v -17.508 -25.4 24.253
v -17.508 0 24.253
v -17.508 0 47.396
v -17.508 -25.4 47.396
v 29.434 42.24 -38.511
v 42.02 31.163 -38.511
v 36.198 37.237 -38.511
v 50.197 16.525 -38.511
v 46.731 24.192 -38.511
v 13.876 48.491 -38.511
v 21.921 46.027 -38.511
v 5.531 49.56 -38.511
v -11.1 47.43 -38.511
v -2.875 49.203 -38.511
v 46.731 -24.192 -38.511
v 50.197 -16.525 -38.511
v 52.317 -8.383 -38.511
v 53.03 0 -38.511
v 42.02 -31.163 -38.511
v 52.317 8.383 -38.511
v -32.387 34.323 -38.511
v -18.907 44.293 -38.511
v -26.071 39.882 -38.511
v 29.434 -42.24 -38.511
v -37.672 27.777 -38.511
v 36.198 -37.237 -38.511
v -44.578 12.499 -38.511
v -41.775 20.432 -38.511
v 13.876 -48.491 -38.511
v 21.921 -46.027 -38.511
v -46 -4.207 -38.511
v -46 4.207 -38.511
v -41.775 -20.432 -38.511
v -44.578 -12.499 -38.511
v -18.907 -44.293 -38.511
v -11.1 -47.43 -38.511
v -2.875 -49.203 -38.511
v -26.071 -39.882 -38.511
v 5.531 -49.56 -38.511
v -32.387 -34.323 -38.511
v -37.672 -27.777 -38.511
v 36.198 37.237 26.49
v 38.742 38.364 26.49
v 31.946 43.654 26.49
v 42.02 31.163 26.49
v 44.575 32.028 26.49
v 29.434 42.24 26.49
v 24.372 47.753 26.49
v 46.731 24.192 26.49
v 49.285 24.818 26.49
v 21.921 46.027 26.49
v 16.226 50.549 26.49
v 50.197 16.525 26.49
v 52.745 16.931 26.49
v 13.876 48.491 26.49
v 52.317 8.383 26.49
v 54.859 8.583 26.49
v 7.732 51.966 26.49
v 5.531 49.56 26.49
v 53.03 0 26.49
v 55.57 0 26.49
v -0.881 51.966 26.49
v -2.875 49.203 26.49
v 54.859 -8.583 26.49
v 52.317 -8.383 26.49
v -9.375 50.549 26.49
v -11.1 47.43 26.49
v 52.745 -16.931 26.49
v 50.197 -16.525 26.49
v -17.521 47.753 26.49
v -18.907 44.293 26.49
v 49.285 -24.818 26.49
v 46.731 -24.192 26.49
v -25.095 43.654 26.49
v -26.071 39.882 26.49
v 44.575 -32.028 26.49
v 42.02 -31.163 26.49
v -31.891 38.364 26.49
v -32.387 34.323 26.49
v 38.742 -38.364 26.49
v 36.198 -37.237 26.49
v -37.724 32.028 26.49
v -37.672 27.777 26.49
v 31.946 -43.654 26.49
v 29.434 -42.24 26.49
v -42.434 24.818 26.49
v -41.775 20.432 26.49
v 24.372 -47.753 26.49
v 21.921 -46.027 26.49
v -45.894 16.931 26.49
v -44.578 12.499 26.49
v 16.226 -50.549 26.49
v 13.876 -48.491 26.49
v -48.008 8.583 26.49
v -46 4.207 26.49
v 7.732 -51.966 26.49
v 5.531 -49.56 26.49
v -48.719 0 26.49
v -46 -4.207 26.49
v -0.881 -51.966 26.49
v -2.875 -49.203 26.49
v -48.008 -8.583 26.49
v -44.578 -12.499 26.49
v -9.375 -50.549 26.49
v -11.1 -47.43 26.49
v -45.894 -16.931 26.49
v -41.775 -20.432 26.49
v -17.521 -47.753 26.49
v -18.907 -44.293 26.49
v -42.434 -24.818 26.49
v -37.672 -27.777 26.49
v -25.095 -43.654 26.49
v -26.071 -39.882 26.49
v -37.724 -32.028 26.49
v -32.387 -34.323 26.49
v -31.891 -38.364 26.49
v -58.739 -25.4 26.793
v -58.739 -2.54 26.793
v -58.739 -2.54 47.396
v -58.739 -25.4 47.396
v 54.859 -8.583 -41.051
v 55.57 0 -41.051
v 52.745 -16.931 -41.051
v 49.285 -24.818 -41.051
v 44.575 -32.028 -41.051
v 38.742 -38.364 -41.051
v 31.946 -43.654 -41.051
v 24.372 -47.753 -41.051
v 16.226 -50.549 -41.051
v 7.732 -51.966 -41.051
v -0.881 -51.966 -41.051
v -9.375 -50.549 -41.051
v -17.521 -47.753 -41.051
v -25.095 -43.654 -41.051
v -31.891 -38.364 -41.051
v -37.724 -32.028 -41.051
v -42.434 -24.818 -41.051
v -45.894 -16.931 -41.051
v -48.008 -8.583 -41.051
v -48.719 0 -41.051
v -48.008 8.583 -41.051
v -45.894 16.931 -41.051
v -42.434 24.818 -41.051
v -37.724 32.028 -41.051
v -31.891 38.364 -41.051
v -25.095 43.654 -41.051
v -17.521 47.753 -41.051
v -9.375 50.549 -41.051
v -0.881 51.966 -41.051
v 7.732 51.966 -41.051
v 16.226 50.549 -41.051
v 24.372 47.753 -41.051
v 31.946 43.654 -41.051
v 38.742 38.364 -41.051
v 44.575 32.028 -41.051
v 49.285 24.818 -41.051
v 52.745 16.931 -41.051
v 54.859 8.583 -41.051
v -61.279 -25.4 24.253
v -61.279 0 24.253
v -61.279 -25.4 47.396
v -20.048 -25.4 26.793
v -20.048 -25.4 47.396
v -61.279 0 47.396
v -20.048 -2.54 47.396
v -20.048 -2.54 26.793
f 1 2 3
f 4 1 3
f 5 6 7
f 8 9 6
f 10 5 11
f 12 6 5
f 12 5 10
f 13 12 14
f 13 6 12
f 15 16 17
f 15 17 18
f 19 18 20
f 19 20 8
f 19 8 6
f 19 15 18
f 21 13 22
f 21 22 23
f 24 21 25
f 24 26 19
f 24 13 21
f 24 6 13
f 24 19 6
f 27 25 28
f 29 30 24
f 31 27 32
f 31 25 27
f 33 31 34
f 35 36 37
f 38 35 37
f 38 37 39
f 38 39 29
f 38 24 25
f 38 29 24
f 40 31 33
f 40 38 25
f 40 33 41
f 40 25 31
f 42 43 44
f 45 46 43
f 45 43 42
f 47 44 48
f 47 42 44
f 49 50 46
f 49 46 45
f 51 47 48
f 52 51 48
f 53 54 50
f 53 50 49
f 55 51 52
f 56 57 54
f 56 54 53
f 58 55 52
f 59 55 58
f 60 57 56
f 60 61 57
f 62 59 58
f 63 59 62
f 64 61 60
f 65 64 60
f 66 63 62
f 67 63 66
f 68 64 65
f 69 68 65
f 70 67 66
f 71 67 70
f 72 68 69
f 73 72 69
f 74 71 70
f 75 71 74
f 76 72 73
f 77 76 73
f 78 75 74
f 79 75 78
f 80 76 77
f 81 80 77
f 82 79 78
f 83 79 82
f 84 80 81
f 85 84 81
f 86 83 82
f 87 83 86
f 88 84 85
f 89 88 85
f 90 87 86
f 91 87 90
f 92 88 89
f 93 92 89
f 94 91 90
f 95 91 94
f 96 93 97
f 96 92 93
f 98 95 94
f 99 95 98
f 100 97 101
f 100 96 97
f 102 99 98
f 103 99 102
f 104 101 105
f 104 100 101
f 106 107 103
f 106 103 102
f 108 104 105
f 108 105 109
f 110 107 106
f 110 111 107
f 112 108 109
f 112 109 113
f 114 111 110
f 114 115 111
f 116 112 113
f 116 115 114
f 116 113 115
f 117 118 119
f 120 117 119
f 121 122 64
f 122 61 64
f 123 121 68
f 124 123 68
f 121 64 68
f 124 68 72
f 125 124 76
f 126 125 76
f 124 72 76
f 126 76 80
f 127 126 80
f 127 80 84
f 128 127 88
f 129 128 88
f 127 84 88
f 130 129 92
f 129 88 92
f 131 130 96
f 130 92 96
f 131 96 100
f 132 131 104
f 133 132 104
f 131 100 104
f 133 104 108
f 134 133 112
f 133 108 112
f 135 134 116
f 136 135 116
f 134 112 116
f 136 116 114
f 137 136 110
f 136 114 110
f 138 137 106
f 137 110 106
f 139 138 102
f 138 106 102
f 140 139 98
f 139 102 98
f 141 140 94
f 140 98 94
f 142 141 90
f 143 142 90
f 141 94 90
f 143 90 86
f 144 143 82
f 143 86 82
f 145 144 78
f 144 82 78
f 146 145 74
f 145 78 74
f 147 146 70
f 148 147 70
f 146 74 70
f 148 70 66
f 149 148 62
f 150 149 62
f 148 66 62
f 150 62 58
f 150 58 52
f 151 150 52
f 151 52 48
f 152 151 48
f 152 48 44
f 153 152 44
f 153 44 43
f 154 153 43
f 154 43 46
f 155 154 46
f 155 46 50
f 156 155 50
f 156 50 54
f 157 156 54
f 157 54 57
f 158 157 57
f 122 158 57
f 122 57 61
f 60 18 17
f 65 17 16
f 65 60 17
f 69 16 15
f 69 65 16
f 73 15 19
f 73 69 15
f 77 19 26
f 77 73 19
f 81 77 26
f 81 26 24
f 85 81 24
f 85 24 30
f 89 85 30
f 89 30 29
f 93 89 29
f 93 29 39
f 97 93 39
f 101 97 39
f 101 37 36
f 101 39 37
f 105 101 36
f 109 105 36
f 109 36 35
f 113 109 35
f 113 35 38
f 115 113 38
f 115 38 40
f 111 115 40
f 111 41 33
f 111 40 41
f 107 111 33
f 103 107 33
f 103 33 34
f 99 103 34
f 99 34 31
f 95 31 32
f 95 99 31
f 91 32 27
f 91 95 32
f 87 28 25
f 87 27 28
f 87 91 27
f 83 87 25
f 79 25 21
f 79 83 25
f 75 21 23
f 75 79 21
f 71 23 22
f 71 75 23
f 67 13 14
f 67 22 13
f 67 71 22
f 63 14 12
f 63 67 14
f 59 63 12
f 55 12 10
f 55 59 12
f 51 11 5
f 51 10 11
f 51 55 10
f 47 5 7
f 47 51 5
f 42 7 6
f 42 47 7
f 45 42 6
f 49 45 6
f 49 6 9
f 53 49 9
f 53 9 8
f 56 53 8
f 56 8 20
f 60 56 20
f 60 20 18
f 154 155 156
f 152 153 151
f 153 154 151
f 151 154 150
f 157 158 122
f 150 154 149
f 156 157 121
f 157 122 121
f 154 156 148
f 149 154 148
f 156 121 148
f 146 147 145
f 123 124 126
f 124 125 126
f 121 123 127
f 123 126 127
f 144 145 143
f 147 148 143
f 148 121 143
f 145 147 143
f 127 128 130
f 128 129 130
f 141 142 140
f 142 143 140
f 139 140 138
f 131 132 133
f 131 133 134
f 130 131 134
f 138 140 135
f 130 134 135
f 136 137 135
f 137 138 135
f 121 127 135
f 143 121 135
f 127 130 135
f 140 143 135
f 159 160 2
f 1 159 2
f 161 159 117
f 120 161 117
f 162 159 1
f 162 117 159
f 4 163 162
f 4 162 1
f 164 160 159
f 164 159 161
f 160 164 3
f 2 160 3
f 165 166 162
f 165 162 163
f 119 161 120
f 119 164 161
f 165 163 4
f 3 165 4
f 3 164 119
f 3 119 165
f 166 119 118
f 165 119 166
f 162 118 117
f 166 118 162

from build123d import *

# Parameters (mm, degrees)
F0_W     = 43.7709279358
F0_H     = 23.1423955411
F1_DEPTH = 25.4
F0_W_2   = 52.1444918122
F0_H_2   = 67.5410274416
F4_T     = -2.54
F4_2_T   = -2.54


with BuildPart() as f1:
    # F0 (on Front) → F1 (new body)
    with BuildSketch(Plane.XZ):
        with Locations((-39.3938366324, 35.8244562522)):
            Rectangle(F0_W, F0_H)
    extrude(amount=F1_DEPTH)

    # F4
    f4_openings = [f1.faces().sort_by_distance(p)[0] for p in [
        (-39.393837, -12.7, 47.395654),
        (-39.393837, -25.4, 35.824456),
    ]]
    offset(amount=F4_T, openings=f4_openings)


with BuildPart() as f1b:
    # F0 (on Front) → F1, piece 2 (new body)
    with BuildSketch(Plane.XZ):
        with Locations((29.4977977173, -7.2803152725)):
            Rectangle(F0_W_2, F0_H_2)
    extrude(amount=F1_DEPTH)


with BuildPart() as f3:
    # F0 (on Front) → F3 (revolve)
    with BuildSketch(Plane.XZ):
        with Locations((29.4977977173, -7.2803152725)):
            Rectangle(F0_W_2, F0_H_2)
    revolve(axis=Axis((3.4255518112, 0, -7.2803152725), (0, 0, -1)))

    # F4#2
    f4_2_openings = [f3.faces().sort_by_distance(p)[0] for p in [
        (3.425552, 0, 26.490198),
    ]]
    offset(amount=F4_2_T, openings=f4_2_openings)


solid = Compound([f1.part, f3.part])
